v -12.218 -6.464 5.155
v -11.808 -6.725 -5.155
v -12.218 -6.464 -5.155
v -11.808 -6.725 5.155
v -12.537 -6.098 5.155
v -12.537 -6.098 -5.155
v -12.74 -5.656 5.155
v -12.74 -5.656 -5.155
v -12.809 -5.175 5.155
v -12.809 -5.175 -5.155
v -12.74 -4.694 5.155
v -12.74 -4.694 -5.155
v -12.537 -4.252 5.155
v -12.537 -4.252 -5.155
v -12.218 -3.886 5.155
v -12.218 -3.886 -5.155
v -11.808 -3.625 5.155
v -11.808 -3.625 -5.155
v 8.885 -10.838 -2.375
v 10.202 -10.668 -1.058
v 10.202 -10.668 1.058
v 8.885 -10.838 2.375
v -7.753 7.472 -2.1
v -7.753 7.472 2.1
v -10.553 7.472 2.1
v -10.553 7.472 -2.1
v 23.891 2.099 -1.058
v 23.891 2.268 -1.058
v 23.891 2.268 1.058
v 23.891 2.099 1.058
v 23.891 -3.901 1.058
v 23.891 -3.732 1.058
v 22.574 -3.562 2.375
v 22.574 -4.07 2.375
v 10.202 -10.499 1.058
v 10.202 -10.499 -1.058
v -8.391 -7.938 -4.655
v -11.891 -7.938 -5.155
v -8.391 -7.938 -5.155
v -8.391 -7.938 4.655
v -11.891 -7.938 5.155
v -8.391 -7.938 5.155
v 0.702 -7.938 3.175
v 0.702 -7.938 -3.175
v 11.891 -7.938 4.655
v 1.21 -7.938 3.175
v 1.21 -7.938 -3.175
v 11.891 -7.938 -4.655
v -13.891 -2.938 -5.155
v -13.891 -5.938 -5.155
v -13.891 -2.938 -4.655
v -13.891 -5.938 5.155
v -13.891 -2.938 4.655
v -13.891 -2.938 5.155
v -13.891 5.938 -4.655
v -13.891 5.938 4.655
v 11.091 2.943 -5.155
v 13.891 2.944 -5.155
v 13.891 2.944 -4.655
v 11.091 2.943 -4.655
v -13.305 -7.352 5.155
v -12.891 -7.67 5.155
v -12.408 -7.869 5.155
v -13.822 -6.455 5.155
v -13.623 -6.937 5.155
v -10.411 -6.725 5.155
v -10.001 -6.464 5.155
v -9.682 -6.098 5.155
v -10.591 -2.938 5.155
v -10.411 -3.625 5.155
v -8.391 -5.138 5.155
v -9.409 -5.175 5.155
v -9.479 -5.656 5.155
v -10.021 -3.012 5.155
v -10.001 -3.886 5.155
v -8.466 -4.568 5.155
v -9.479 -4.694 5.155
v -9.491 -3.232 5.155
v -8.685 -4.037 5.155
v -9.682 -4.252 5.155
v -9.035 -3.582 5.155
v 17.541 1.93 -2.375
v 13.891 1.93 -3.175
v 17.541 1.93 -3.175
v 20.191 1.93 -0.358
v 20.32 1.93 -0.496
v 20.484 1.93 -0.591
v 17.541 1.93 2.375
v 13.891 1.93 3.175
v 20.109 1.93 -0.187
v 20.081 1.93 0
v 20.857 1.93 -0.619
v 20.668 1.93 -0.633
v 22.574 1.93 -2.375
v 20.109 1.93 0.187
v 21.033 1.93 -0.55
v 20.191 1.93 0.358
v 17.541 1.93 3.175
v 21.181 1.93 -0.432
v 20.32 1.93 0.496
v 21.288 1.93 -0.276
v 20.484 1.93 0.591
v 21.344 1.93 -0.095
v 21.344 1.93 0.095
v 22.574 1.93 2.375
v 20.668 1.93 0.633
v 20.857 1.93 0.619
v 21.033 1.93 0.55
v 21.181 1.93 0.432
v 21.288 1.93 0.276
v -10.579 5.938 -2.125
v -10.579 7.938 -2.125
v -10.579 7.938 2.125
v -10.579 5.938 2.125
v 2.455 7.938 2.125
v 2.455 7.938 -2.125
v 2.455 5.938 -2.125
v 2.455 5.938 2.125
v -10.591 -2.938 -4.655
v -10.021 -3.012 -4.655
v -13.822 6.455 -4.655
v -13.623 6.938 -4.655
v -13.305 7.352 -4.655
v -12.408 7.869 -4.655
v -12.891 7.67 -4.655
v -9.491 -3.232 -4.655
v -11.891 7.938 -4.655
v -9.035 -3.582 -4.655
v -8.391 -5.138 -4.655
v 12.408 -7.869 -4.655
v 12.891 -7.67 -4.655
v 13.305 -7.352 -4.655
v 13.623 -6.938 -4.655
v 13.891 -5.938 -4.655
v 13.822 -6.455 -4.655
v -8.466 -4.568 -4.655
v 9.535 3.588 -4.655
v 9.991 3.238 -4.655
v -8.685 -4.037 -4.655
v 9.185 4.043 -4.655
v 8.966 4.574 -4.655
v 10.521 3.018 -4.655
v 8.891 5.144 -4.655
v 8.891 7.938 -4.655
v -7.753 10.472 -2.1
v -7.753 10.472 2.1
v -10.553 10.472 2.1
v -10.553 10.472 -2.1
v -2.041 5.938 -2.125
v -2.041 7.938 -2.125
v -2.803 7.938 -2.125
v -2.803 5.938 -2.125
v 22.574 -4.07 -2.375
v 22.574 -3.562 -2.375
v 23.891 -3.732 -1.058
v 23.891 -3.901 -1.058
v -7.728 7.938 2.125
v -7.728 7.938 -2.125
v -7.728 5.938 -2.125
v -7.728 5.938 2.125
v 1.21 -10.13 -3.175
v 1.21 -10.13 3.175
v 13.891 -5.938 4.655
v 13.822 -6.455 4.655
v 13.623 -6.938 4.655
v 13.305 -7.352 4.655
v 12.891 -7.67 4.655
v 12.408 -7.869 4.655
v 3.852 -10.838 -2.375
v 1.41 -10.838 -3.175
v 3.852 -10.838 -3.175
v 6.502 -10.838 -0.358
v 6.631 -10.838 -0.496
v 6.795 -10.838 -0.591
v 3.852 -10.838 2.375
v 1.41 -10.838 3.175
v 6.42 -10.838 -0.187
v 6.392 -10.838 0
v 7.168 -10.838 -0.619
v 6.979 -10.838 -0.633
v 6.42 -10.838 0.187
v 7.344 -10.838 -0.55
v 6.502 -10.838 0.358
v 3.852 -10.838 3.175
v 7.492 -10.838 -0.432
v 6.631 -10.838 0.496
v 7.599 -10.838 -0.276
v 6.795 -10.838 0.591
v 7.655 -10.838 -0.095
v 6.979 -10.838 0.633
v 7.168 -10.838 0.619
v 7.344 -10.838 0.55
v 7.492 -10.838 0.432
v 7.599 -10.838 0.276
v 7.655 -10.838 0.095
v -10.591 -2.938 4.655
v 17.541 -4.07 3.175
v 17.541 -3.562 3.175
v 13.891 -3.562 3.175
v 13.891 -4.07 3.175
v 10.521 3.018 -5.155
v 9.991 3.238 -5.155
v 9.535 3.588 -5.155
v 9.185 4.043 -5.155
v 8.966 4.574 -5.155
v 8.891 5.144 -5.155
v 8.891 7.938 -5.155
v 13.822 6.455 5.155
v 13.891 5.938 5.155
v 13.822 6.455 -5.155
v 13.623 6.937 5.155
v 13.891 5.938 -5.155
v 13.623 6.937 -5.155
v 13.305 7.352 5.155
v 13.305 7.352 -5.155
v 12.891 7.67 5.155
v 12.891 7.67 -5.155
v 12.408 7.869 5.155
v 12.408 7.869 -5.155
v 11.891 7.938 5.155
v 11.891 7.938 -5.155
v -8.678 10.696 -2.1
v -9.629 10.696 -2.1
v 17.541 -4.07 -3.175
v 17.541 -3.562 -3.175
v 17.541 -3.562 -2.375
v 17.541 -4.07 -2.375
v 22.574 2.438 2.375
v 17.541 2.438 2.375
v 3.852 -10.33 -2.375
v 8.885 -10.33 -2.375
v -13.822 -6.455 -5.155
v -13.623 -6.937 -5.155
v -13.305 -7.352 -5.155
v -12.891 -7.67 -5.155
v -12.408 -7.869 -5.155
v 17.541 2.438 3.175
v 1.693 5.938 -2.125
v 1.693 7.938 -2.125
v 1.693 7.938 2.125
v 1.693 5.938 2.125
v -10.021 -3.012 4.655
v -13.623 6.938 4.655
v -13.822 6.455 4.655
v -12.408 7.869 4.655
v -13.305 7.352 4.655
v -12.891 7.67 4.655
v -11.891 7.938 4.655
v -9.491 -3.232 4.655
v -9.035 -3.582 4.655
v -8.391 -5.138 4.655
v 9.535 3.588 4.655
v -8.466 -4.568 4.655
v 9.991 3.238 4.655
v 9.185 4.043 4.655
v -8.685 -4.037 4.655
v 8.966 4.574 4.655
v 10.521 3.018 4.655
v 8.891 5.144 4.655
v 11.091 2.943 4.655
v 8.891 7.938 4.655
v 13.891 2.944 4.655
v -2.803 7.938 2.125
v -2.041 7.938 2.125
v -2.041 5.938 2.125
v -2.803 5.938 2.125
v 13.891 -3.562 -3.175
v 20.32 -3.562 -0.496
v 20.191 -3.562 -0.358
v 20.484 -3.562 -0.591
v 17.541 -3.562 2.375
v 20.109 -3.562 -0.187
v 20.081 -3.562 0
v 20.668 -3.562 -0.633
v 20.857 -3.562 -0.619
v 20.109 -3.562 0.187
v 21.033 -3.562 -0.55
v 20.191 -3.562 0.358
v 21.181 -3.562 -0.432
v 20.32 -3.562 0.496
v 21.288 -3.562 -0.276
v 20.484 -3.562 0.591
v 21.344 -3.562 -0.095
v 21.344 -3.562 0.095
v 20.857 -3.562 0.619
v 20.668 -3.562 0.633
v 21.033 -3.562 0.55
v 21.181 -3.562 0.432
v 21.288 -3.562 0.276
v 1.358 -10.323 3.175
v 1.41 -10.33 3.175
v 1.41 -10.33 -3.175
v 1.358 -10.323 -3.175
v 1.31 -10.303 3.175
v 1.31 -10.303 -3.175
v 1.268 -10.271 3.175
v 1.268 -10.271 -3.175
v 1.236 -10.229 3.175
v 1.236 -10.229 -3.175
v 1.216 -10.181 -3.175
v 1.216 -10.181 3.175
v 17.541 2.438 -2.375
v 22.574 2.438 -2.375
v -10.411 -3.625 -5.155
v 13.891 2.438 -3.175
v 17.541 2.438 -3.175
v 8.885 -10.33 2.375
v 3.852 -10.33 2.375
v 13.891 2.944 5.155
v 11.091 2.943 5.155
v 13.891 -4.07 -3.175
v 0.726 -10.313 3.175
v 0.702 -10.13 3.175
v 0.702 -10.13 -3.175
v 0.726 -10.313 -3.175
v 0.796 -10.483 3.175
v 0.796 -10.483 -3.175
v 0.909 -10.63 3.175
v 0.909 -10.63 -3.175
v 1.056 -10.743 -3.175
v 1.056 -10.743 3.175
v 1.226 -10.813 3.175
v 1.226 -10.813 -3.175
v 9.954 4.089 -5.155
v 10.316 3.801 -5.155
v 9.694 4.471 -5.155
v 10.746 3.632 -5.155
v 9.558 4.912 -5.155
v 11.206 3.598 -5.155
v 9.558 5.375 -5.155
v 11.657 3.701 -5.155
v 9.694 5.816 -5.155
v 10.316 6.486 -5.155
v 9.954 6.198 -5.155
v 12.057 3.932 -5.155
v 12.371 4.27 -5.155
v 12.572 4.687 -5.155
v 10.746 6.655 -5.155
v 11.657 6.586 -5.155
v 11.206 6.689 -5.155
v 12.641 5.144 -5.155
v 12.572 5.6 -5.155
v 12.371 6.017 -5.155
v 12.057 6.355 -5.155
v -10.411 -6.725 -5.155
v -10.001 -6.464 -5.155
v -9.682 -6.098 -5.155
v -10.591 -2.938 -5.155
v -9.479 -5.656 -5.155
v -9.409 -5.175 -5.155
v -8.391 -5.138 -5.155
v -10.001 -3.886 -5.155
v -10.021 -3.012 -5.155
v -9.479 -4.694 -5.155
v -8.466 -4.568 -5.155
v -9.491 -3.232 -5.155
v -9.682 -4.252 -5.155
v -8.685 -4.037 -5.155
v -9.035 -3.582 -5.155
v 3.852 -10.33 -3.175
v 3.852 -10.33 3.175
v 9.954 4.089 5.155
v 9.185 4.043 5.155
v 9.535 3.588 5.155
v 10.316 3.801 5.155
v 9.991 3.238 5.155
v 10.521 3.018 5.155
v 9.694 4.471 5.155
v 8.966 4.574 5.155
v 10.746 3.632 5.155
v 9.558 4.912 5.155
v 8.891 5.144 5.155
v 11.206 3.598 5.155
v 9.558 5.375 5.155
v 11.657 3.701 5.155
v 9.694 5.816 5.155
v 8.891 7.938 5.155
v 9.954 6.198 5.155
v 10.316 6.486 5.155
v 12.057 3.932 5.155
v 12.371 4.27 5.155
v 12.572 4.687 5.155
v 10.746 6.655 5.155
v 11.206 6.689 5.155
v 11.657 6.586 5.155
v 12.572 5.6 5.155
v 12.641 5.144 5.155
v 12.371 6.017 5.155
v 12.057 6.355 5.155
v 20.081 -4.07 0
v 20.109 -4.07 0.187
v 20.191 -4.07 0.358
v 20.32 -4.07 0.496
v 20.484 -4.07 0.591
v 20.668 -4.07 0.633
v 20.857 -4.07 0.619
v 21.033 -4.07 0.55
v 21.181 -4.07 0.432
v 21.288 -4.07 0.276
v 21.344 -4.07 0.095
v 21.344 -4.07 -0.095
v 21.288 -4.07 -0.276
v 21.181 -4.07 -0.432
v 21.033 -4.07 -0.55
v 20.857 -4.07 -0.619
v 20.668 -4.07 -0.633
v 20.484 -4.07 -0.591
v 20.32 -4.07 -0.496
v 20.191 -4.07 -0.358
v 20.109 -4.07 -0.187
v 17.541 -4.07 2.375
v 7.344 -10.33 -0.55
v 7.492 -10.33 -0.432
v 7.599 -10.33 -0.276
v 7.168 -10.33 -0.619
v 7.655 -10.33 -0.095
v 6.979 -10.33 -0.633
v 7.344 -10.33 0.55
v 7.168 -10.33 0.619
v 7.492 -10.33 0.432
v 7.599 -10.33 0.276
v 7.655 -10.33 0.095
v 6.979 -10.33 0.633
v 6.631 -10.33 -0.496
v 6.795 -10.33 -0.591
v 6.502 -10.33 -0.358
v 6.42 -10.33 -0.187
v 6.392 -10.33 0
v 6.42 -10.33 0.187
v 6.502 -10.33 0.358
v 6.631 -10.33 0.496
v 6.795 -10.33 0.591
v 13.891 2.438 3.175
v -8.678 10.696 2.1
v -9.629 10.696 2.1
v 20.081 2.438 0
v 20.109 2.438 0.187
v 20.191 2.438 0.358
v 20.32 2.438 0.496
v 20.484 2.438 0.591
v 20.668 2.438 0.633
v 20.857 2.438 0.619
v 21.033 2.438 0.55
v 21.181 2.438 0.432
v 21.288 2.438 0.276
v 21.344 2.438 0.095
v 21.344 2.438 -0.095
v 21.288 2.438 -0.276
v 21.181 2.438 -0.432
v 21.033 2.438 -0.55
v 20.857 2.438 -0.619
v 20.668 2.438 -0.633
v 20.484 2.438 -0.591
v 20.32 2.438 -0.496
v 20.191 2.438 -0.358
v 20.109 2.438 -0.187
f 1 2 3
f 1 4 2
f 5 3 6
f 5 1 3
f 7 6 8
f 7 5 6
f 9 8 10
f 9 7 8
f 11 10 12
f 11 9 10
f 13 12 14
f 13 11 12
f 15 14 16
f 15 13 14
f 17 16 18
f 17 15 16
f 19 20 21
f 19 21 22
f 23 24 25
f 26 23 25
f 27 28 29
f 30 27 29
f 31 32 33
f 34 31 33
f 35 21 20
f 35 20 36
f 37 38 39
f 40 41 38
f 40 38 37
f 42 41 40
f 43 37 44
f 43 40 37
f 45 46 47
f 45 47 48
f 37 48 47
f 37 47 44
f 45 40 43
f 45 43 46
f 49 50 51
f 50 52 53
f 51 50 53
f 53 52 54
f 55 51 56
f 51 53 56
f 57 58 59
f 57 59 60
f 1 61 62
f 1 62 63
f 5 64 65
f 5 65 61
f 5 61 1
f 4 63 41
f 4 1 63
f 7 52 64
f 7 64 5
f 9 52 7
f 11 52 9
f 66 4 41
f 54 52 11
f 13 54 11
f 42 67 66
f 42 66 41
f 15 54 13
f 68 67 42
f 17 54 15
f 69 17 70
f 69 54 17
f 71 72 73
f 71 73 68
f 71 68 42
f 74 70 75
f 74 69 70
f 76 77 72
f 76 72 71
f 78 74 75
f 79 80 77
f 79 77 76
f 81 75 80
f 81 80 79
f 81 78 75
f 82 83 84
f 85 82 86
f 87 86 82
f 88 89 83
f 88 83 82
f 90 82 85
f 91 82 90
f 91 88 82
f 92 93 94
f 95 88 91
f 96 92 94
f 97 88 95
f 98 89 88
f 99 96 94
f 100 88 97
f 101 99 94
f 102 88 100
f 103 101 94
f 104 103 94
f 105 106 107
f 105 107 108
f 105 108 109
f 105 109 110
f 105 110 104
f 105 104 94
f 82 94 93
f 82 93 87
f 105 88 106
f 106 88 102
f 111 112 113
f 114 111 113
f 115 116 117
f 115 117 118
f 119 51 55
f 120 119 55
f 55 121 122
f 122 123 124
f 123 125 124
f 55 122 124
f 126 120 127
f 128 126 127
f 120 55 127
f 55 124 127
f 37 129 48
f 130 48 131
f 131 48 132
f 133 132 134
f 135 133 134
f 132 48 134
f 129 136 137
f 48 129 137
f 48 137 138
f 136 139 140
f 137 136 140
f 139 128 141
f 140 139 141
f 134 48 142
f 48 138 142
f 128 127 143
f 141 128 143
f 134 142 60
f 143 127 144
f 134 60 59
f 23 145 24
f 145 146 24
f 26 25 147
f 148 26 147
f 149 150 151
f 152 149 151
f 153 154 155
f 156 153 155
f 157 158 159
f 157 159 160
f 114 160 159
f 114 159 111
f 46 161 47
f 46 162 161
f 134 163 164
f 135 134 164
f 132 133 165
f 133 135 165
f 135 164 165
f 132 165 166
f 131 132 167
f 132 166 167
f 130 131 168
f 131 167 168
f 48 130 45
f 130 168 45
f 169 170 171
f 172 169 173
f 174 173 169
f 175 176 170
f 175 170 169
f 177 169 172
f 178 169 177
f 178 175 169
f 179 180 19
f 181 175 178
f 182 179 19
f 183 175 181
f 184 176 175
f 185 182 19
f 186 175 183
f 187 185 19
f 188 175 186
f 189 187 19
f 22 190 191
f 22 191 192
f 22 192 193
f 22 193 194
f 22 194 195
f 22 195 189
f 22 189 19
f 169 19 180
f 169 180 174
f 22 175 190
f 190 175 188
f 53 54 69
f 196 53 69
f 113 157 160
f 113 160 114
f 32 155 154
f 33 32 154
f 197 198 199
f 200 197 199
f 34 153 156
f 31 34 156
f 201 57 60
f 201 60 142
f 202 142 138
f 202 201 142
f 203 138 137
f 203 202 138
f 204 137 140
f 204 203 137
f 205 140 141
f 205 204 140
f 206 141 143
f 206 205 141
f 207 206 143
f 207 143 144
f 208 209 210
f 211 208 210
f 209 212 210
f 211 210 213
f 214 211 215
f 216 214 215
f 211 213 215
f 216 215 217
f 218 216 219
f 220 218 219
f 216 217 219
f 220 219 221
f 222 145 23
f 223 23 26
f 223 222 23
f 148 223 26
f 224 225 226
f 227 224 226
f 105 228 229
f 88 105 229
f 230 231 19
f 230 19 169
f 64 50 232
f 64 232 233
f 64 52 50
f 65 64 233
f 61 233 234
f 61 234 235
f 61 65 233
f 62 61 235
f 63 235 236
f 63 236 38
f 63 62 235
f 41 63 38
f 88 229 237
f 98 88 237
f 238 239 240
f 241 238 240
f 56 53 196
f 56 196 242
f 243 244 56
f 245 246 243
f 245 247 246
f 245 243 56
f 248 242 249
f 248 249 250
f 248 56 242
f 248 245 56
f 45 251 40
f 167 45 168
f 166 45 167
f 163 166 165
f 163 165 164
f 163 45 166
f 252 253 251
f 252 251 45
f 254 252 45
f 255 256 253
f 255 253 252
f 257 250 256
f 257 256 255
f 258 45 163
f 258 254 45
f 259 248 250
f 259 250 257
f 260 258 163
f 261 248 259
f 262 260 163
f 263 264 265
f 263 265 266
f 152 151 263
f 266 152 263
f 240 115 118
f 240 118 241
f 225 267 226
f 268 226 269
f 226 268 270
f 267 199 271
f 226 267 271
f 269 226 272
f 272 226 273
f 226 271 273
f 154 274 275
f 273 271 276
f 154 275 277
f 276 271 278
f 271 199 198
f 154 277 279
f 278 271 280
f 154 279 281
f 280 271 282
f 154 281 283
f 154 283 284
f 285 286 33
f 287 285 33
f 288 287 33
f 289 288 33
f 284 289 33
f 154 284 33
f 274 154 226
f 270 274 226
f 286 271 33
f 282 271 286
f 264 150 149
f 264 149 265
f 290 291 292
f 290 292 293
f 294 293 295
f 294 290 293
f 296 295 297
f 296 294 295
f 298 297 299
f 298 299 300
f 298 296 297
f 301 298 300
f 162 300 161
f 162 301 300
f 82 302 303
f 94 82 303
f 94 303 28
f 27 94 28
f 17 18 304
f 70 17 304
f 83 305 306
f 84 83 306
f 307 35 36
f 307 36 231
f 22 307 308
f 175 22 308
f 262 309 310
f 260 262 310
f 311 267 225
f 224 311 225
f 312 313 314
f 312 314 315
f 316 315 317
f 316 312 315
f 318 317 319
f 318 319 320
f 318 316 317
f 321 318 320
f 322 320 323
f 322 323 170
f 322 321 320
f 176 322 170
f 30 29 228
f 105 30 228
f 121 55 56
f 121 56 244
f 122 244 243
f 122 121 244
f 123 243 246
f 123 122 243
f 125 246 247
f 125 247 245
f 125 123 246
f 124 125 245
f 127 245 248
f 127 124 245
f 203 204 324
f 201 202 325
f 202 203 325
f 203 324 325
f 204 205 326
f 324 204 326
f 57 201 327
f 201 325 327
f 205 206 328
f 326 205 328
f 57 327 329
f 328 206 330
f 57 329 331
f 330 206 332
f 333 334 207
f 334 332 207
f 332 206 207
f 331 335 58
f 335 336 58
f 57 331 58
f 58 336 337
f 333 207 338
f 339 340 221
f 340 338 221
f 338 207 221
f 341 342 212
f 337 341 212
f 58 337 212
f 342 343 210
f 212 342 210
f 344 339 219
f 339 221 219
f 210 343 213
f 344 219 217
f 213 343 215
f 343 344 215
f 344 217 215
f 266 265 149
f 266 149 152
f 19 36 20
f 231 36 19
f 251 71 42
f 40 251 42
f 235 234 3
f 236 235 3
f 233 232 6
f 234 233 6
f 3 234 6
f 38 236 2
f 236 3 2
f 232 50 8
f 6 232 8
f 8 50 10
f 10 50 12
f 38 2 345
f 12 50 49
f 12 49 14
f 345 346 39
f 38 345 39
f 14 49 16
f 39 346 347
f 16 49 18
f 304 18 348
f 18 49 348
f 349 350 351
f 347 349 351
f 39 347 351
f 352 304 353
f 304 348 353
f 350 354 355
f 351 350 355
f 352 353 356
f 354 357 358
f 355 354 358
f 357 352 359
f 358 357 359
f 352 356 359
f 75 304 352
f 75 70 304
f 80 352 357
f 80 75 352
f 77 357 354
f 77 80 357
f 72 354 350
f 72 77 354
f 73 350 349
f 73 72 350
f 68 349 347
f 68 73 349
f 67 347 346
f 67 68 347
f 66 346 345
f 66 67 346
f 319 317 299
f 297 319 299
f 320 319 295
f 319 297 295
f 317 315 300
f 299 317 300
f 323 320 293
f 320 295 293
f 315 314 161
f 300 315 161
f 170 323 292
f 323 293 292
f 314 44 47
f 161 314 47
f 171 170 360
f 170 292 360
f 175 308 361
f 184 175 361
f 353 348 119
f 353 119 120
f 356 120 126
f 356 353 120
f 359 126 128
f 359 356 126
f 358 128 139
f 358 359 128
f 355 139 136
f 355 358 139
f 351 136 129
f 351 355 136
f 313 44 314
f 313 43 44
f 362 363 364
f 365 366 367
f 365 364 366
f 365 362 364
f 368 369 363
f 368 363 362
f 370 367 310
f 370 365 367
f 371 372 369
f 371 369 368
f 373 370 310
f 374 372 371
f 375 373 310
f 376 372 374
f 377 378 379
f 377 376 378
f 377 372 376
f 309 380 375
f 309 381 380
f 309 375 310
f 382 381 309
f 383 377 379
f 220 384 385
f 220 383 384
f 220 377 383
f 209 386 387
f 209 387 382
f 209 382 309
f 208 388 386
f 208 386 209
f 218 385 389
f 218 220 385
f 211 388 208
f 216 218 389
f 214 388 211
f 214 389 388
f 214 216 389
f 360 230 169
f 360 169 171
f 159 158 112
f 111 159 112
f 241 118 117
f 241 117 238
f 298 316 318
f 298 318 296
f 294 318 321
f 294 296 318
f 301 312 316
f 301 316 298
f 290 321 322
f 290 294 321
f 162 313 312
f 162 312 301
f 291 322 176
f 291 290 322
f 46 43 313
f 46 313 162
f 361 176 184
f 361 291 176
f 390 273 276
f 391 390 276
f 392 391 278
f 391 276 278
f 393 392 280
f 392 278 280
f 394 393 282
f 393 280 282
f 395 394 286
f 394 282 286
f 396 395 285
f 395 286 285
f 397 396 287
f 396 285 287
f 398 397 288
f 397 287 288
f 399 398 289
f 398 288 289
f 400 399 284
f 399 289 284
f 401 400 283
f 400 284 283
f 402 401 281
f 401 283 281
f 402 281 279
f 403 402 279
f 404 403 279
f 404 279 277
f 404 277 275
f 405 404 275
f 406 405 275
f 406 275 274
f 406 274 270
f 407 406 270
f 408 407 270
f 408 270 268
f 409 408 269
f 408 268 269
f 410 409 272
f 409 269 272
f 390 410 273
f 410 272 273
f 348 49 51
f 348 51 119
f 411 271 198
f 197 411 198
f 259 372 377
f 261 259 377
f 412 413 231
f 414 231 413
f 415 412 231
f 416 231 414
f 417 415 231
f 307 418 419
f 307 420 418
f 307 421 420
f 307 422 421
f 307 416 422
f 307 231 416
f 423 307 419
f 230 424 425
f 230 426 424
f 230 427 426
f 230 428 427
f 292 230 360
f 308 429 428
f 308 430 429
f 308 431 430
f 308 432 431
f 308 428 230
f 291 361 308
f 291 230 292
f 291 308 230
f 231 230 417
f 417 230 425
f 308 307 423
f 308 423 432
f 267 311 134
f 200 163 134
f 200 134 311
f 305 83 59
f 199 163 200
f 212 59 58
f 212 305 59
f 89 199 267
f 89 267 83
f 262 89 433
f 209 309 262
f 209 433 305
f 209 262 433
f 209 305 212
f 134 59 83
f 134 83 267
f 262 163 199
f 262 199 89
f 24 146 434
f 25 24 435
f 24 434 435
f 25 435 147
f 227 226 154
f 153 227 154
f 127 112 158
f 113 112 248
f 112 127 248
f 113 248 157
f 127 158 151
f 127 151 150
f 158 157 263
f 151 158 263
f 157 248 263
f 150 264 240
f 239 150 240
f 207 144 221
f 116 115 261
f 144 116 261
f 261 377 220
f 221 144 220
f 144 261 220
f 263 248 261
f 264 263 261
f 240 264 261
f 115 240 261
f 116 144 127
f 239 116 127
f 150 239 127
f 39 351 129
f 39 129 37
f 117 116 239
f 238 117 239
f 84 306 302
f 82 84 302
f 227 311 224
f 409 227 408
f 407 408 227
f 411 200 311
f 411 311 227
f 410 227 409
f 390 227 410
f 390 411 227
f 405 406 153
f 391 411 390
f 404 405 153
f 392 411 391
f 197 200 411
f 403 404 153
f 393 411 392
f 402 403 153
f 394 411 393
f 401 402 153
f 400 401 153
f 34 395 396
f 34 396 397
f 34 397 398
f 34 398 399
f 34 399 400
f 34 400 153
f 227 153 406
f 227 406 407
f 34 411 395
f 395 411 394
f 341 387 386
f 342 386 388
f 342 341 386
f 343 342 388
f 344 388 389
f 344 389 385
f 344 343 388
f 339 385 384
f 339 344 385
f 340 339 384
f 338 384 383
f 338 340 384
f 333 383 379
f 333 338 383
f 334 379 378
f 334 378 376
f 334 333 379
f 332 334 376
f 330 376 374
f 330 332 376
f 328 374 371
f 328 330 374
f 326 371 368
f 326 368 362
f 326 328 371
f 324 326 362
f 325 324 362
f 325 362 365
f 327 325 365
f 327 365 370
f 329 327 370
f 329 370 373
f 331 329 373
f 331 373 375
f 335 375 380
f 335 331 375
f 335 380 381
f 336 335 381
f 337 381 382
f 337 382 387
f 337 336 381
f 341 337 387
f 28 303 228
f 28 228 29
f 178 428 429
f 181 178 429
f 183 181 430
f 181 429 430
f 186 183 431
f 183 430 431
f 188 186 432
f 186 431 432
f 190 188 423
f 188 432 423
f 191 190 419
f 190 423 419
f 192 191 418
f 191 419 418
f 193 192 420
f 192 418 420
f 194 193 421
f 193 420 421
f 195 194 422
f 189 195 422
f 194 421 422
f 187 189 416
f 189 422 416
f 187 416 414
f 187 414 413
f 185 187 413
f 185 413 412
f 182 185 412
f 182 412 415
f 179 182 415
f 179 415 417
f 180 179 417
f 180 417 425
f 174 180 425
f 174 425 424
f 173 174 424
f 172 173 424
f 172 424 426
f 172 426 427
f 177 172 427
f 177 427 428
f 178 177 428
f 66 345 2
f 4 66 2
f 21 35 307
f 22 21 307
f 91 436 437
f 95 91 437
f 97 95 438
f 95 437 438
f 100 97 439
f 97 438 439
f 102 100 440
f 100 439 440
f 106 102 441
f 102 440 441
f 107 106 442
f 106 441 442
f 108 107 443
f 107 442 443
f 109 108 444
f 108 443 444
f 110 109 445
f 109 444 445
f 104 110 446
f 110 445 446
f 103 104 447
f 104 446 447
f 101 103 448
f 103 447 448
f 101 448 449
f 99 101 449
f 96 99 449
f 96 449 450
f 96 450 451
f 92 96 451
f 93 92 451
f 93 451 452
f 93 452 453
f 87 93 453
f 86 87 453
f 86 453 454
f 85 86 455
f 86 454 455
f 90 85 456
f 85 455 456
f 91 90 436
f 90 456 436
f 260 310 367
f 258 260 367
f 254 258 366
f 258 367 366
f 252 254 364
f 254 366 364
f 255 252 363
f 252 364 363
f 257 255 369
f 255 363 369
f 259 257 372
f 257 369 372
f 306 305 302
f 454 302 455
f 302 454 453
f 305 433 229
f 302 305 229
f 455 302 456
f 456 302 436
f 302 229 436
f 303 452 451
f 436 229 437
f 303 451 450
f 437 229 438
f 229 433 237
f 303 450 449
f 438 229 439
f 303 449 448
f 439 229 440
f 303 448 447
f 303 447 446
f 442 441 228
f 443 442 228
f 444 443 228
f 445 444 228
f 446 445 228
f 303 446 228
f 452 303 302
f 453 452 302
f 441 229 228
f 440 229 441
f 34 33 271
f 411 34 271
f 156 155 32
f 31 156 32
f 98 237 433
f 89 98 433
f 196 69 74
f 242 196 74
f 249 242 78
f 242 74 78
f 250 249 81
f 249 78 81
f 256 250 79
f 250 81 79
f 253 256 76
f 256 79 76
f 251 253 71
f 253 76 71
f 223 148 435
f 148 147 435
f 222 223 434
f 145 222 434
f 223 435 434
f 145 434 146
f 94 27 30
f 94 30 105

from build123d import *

# Parameters (mm, degrees)
SKETCH1_W               = 27.78125
SKETCH1_H               = 15.875
SKETCH1_R               = 1.55
EXTRUDE1_DEPTH          = 5.155
FILLET1_R               = 2
EXTRUDE2_DEPTH          = 2.1
SKETCH3_W               = 2.8508
SKETCH3_H               = 4.2508
SKETCH3_W_2             = 0.762
CUT_EXTRUDE1_DEPTH      = 2
CUT_EXTRUDE2_DEPTH      = 0.5
EXTRUDE3_DEPTH          = 3.175
SKETCH6_R               = 0.635
CUT_EXTRUDE3_DEPTH      = 26.744998173
EXTRUDE4_START          = -5.5
SKETCH8_R               = 0.635
EXTRUDE4_DEPTH          = 0.508
LPATTERN1_COUNT         = 2
LPATTERN1_PITCH         = 6
CUT_EXTRUDE4_DEPTH      = 27.735508115
CUT_EXTRUDE4_DEPTH_BACK = 27.735508115


with BuildPart() as part:
    # Sketch1 → Extrude1 (new, symmetric)
    with BuildSketch(Plane.XY):
        Rectangle(SKETCH1_W, SKETCH1_H)
        with Locations((11.090625, 5.1435)):
            Circle(SKETCH1_R, mode=Mode.SUBTRACT)
        with BuildLine():
            Line((-11.807587002, -3.62525), (-10.411162998, -3.62525))
            ThreePointArc((-10.411162998, -3.62525), (-9.409375, -5.17525), (-10.411162998, -6.72525))
            Line((-10.411162998, -6.72525), (-11.807587002, -6.72525))
            ThreePointArc((-11.807587002, -6.72525), (-12.809375, -5.17525), (-11.807587002, -3.62525))
        make_face(mode=Mode.SUBTRACT)
    extrude(amount=EXTRUDE1_DEPTH, both=True)

    # Fillet1
    fillet1_edges = [part.edges().sort_by_distance(p)[0] for p in [
        (-13.890625, 7.9375, 0),
        (13.890625, 7.9375, 0),
        (13.890625, -7.9375, 0),
        (-13.890625, -7.9375, 0),
    ]]
    fillet(fillet1_edges, radius=FILLET1_R)

    # Sketch3 → Cut-Extrude1 (cut)
    with BuildSketch(Plane(origin=(0, 7.9375, 0), x_dir=(-1, 0, 0), z_dir=(0, 1, 0))):
        with Locations((9.153175, 0)):
            Rectangle(SKETCH3_W, SKETCH3_H)
        with Locations((2.422175, 0)):
            Rectangle(SKETCH3_W_2, SKETCH3_H)
        with Locations((-2.073625, 0)):
            Rectangle(SKETCH3_W_2, SKETCH3_H)
    extrude(amount=-CUT_EXTRUDE1_DEPTH, mode=Mode.SUBTRACT)

    # Sketch4 → Cut-Extrude2 (cut)
    with BuildSketch(Plane.XY.offset(5.155)):
        with BuildLine():
            Line((-8.390625, -7.9375), (13.890625, -7.9375))
            Line((13.890625, -7.9375), (13.890625, 2.9435))
            Line((13.890625, 2.9435), (11.090625, 2.9435))
            ThreePointArc((11.090625, 2.9435), (9.534990081, 3.587865081), (8.890625, 5.1435))
            Line((8.890625, 5.1435), (8.890625, 7.9375))
            Line((8.890625, 7.9375), (-13.890625, 7.9375))
            Line((-13.890625, 7.9375), (-13.890625, -2.9375))
            Line((-13.890625, -2.9375), (-10.590625, -2.9375))
            ThreePointArc((-10.590625, -2.9375), (-9.034990081, -3.581865081), (-8.390625, -5.1375))
            Line((-8.390625, -5.1375), (-8.390625, -7.9375))
        make_face()
    cut_extrude2 = extrude(amount=-CUT_EXTRUDE2_DEPTH, mode=Mode.SUBTRACT)

    # Mirror1: Cut-Extrude2 across plane
    add(cut_extrude2.mirror(Plane.XY), mode=Mode.SUBTRACT)

    # Sketch5 → Extrude3 (add, symmetric)
    with BuildSketch(Plane.XY):
        with BuildLine():
            Line((0.701625, -7.9375), (0.701625, -10.1295))
            ThreePointArc((0.701625, -10.1295), (0.908993399, -10.630131601), (1.409625, -10.8375))
            Line((1.409625, -10.8375), (10.201625, -10.8375))
            Line((10.201625, -10.8375), (10.201625, -10.3295))
            Line((10.201625, -10.3295), (1.409625, -10.3295))
            ThreePointArc((1.409625, -10.3295), (1.268203644, -10.270921356), (1.209625, -10.1295))
            Line((1.209625, -10.1295), (1.209625, -7.9375))
            Line((1.209625, -7.9375), (0.701625, -7.9375))
        make_face()
    extrude(amount=EXTRUDE3_DEPTH, both=True)

    # Sketch6 → Cut-Extrude3 (cut, through all)
    with BuildSketch(Plane(origin=(0, -10.3295, 0), x_dir=(-1, 0, 0), z_dir=(0, 1, 0))):
        with Locations((-7.026625, 0)):
            Circle(SKETCH6_R)
        Polygon((-10.201625, 1.058333333), (-8.885058333, 2.3749), (-3.851625, 2.3749), (-3.851625, 3.175), (-10.201625, 3.175), align=None)
        Polygon((-10.201625, -3.175), (-10.201625, -1.058333333), (-8.885058333, -2.3749), (-3.851625, -2.3749), (-3.851625, -3.175), align=None)
    extrude(amount=-CUT_EXTRUDE3_DEPTH, mode=Mode.SUBTRACT)

    # Sketch8 → Extrude4 (add)
    with BuildSketch(Plane(origin=(0, 7.9375, 0), x_dir=(-1, 0, 0), z_dir=(0, 1, 0)).offset(EXTRUDE4_START)):
        Polygon((-13.890625, -3.175), (-17.540625, -3.175), (-17.540625, -2.3749), (-22.574058333, -2.3749), (-23.890625, -1.058333333), (-23.890625, 1.058333333), (-22.574058333, 2.3749), (-17.540625, 2.3749), (-17.540625, 3.175), (-13.890625, 3.175), align=None)
        with Locations((-20.715625, 0)):
            Circle(SKETCH8_R, mode=Mode.SUBTRACT)
    extrude4 = extrude(amount=-EXTRUDE4_DEPTH)

    # LPattern1: Extrude4 ×2
    with Locations(*[(0, -i * LPATTERN1_PITCH, 0) for i in range(1, LPATTERN1_COUNT)]):
        add(extrude4)

    # Sketch7 → Cut-Extrude4 (cut, two sides: drawn at the far end of the back side and taken through both)
    with BuildSketch(Plane.XY.offset(-CUT_EXTRUDE4_DEPTH_BACK)):
        Polygon((8.885058333, -10.3295), (10.201625, -10.3295), (10.201625, -10.498833333), align=None)
        Polygon((8.885058333, -10.8375), (10.201625, -10.8375), (10.201625, -10.668166667), align=None)
        Polygon((22.574058333, 2.4375), (23.890625, 2.268166667), (23.890625, 2.4375), align=None)
        Polygon((22.574058333, 1.9295), (23.890625, 1.9295), (23.890625, 2.098833333), align=None)
        Polygon((23.890625, -3.5625), (23.890625, -3.731833333), (22.574058333, -3.5625), align=None)
        Polygon((23.890625, -3.901166667), (23.890625, -4.0705), (22.574058333, -4.0705), align=None)
    extrude(amount=CUT_EXTRUDE4_DEPTH + CUT_EXTRUDE4_DEPTH_BACK, mode=Mode.SUBTRACT)


with BuildPart() as body_2:
    # Sketch2 → Extrude2 (new, symmetric)
    with BuildSketch(Plane.XY):
        with BuildLine():
            Line((-10.553175, 7.471748799), (-10.553175, 10.471748799))
            ThreePointArc((-10.553175, 10.471748799), (-9.153175, 10.72475), (-7.753175, 10.471748799))
            Line((-7.753175, 10.471748799), (-7.753175, 7.471748799))
            Line((-7.753175, 7.471748799), (-10.553175, 7.471748799))
        make_face()
    extrude(amount=EXTRUDE2_DEPTH, both=True)


solid = Compound([part.part, body_2.part])
